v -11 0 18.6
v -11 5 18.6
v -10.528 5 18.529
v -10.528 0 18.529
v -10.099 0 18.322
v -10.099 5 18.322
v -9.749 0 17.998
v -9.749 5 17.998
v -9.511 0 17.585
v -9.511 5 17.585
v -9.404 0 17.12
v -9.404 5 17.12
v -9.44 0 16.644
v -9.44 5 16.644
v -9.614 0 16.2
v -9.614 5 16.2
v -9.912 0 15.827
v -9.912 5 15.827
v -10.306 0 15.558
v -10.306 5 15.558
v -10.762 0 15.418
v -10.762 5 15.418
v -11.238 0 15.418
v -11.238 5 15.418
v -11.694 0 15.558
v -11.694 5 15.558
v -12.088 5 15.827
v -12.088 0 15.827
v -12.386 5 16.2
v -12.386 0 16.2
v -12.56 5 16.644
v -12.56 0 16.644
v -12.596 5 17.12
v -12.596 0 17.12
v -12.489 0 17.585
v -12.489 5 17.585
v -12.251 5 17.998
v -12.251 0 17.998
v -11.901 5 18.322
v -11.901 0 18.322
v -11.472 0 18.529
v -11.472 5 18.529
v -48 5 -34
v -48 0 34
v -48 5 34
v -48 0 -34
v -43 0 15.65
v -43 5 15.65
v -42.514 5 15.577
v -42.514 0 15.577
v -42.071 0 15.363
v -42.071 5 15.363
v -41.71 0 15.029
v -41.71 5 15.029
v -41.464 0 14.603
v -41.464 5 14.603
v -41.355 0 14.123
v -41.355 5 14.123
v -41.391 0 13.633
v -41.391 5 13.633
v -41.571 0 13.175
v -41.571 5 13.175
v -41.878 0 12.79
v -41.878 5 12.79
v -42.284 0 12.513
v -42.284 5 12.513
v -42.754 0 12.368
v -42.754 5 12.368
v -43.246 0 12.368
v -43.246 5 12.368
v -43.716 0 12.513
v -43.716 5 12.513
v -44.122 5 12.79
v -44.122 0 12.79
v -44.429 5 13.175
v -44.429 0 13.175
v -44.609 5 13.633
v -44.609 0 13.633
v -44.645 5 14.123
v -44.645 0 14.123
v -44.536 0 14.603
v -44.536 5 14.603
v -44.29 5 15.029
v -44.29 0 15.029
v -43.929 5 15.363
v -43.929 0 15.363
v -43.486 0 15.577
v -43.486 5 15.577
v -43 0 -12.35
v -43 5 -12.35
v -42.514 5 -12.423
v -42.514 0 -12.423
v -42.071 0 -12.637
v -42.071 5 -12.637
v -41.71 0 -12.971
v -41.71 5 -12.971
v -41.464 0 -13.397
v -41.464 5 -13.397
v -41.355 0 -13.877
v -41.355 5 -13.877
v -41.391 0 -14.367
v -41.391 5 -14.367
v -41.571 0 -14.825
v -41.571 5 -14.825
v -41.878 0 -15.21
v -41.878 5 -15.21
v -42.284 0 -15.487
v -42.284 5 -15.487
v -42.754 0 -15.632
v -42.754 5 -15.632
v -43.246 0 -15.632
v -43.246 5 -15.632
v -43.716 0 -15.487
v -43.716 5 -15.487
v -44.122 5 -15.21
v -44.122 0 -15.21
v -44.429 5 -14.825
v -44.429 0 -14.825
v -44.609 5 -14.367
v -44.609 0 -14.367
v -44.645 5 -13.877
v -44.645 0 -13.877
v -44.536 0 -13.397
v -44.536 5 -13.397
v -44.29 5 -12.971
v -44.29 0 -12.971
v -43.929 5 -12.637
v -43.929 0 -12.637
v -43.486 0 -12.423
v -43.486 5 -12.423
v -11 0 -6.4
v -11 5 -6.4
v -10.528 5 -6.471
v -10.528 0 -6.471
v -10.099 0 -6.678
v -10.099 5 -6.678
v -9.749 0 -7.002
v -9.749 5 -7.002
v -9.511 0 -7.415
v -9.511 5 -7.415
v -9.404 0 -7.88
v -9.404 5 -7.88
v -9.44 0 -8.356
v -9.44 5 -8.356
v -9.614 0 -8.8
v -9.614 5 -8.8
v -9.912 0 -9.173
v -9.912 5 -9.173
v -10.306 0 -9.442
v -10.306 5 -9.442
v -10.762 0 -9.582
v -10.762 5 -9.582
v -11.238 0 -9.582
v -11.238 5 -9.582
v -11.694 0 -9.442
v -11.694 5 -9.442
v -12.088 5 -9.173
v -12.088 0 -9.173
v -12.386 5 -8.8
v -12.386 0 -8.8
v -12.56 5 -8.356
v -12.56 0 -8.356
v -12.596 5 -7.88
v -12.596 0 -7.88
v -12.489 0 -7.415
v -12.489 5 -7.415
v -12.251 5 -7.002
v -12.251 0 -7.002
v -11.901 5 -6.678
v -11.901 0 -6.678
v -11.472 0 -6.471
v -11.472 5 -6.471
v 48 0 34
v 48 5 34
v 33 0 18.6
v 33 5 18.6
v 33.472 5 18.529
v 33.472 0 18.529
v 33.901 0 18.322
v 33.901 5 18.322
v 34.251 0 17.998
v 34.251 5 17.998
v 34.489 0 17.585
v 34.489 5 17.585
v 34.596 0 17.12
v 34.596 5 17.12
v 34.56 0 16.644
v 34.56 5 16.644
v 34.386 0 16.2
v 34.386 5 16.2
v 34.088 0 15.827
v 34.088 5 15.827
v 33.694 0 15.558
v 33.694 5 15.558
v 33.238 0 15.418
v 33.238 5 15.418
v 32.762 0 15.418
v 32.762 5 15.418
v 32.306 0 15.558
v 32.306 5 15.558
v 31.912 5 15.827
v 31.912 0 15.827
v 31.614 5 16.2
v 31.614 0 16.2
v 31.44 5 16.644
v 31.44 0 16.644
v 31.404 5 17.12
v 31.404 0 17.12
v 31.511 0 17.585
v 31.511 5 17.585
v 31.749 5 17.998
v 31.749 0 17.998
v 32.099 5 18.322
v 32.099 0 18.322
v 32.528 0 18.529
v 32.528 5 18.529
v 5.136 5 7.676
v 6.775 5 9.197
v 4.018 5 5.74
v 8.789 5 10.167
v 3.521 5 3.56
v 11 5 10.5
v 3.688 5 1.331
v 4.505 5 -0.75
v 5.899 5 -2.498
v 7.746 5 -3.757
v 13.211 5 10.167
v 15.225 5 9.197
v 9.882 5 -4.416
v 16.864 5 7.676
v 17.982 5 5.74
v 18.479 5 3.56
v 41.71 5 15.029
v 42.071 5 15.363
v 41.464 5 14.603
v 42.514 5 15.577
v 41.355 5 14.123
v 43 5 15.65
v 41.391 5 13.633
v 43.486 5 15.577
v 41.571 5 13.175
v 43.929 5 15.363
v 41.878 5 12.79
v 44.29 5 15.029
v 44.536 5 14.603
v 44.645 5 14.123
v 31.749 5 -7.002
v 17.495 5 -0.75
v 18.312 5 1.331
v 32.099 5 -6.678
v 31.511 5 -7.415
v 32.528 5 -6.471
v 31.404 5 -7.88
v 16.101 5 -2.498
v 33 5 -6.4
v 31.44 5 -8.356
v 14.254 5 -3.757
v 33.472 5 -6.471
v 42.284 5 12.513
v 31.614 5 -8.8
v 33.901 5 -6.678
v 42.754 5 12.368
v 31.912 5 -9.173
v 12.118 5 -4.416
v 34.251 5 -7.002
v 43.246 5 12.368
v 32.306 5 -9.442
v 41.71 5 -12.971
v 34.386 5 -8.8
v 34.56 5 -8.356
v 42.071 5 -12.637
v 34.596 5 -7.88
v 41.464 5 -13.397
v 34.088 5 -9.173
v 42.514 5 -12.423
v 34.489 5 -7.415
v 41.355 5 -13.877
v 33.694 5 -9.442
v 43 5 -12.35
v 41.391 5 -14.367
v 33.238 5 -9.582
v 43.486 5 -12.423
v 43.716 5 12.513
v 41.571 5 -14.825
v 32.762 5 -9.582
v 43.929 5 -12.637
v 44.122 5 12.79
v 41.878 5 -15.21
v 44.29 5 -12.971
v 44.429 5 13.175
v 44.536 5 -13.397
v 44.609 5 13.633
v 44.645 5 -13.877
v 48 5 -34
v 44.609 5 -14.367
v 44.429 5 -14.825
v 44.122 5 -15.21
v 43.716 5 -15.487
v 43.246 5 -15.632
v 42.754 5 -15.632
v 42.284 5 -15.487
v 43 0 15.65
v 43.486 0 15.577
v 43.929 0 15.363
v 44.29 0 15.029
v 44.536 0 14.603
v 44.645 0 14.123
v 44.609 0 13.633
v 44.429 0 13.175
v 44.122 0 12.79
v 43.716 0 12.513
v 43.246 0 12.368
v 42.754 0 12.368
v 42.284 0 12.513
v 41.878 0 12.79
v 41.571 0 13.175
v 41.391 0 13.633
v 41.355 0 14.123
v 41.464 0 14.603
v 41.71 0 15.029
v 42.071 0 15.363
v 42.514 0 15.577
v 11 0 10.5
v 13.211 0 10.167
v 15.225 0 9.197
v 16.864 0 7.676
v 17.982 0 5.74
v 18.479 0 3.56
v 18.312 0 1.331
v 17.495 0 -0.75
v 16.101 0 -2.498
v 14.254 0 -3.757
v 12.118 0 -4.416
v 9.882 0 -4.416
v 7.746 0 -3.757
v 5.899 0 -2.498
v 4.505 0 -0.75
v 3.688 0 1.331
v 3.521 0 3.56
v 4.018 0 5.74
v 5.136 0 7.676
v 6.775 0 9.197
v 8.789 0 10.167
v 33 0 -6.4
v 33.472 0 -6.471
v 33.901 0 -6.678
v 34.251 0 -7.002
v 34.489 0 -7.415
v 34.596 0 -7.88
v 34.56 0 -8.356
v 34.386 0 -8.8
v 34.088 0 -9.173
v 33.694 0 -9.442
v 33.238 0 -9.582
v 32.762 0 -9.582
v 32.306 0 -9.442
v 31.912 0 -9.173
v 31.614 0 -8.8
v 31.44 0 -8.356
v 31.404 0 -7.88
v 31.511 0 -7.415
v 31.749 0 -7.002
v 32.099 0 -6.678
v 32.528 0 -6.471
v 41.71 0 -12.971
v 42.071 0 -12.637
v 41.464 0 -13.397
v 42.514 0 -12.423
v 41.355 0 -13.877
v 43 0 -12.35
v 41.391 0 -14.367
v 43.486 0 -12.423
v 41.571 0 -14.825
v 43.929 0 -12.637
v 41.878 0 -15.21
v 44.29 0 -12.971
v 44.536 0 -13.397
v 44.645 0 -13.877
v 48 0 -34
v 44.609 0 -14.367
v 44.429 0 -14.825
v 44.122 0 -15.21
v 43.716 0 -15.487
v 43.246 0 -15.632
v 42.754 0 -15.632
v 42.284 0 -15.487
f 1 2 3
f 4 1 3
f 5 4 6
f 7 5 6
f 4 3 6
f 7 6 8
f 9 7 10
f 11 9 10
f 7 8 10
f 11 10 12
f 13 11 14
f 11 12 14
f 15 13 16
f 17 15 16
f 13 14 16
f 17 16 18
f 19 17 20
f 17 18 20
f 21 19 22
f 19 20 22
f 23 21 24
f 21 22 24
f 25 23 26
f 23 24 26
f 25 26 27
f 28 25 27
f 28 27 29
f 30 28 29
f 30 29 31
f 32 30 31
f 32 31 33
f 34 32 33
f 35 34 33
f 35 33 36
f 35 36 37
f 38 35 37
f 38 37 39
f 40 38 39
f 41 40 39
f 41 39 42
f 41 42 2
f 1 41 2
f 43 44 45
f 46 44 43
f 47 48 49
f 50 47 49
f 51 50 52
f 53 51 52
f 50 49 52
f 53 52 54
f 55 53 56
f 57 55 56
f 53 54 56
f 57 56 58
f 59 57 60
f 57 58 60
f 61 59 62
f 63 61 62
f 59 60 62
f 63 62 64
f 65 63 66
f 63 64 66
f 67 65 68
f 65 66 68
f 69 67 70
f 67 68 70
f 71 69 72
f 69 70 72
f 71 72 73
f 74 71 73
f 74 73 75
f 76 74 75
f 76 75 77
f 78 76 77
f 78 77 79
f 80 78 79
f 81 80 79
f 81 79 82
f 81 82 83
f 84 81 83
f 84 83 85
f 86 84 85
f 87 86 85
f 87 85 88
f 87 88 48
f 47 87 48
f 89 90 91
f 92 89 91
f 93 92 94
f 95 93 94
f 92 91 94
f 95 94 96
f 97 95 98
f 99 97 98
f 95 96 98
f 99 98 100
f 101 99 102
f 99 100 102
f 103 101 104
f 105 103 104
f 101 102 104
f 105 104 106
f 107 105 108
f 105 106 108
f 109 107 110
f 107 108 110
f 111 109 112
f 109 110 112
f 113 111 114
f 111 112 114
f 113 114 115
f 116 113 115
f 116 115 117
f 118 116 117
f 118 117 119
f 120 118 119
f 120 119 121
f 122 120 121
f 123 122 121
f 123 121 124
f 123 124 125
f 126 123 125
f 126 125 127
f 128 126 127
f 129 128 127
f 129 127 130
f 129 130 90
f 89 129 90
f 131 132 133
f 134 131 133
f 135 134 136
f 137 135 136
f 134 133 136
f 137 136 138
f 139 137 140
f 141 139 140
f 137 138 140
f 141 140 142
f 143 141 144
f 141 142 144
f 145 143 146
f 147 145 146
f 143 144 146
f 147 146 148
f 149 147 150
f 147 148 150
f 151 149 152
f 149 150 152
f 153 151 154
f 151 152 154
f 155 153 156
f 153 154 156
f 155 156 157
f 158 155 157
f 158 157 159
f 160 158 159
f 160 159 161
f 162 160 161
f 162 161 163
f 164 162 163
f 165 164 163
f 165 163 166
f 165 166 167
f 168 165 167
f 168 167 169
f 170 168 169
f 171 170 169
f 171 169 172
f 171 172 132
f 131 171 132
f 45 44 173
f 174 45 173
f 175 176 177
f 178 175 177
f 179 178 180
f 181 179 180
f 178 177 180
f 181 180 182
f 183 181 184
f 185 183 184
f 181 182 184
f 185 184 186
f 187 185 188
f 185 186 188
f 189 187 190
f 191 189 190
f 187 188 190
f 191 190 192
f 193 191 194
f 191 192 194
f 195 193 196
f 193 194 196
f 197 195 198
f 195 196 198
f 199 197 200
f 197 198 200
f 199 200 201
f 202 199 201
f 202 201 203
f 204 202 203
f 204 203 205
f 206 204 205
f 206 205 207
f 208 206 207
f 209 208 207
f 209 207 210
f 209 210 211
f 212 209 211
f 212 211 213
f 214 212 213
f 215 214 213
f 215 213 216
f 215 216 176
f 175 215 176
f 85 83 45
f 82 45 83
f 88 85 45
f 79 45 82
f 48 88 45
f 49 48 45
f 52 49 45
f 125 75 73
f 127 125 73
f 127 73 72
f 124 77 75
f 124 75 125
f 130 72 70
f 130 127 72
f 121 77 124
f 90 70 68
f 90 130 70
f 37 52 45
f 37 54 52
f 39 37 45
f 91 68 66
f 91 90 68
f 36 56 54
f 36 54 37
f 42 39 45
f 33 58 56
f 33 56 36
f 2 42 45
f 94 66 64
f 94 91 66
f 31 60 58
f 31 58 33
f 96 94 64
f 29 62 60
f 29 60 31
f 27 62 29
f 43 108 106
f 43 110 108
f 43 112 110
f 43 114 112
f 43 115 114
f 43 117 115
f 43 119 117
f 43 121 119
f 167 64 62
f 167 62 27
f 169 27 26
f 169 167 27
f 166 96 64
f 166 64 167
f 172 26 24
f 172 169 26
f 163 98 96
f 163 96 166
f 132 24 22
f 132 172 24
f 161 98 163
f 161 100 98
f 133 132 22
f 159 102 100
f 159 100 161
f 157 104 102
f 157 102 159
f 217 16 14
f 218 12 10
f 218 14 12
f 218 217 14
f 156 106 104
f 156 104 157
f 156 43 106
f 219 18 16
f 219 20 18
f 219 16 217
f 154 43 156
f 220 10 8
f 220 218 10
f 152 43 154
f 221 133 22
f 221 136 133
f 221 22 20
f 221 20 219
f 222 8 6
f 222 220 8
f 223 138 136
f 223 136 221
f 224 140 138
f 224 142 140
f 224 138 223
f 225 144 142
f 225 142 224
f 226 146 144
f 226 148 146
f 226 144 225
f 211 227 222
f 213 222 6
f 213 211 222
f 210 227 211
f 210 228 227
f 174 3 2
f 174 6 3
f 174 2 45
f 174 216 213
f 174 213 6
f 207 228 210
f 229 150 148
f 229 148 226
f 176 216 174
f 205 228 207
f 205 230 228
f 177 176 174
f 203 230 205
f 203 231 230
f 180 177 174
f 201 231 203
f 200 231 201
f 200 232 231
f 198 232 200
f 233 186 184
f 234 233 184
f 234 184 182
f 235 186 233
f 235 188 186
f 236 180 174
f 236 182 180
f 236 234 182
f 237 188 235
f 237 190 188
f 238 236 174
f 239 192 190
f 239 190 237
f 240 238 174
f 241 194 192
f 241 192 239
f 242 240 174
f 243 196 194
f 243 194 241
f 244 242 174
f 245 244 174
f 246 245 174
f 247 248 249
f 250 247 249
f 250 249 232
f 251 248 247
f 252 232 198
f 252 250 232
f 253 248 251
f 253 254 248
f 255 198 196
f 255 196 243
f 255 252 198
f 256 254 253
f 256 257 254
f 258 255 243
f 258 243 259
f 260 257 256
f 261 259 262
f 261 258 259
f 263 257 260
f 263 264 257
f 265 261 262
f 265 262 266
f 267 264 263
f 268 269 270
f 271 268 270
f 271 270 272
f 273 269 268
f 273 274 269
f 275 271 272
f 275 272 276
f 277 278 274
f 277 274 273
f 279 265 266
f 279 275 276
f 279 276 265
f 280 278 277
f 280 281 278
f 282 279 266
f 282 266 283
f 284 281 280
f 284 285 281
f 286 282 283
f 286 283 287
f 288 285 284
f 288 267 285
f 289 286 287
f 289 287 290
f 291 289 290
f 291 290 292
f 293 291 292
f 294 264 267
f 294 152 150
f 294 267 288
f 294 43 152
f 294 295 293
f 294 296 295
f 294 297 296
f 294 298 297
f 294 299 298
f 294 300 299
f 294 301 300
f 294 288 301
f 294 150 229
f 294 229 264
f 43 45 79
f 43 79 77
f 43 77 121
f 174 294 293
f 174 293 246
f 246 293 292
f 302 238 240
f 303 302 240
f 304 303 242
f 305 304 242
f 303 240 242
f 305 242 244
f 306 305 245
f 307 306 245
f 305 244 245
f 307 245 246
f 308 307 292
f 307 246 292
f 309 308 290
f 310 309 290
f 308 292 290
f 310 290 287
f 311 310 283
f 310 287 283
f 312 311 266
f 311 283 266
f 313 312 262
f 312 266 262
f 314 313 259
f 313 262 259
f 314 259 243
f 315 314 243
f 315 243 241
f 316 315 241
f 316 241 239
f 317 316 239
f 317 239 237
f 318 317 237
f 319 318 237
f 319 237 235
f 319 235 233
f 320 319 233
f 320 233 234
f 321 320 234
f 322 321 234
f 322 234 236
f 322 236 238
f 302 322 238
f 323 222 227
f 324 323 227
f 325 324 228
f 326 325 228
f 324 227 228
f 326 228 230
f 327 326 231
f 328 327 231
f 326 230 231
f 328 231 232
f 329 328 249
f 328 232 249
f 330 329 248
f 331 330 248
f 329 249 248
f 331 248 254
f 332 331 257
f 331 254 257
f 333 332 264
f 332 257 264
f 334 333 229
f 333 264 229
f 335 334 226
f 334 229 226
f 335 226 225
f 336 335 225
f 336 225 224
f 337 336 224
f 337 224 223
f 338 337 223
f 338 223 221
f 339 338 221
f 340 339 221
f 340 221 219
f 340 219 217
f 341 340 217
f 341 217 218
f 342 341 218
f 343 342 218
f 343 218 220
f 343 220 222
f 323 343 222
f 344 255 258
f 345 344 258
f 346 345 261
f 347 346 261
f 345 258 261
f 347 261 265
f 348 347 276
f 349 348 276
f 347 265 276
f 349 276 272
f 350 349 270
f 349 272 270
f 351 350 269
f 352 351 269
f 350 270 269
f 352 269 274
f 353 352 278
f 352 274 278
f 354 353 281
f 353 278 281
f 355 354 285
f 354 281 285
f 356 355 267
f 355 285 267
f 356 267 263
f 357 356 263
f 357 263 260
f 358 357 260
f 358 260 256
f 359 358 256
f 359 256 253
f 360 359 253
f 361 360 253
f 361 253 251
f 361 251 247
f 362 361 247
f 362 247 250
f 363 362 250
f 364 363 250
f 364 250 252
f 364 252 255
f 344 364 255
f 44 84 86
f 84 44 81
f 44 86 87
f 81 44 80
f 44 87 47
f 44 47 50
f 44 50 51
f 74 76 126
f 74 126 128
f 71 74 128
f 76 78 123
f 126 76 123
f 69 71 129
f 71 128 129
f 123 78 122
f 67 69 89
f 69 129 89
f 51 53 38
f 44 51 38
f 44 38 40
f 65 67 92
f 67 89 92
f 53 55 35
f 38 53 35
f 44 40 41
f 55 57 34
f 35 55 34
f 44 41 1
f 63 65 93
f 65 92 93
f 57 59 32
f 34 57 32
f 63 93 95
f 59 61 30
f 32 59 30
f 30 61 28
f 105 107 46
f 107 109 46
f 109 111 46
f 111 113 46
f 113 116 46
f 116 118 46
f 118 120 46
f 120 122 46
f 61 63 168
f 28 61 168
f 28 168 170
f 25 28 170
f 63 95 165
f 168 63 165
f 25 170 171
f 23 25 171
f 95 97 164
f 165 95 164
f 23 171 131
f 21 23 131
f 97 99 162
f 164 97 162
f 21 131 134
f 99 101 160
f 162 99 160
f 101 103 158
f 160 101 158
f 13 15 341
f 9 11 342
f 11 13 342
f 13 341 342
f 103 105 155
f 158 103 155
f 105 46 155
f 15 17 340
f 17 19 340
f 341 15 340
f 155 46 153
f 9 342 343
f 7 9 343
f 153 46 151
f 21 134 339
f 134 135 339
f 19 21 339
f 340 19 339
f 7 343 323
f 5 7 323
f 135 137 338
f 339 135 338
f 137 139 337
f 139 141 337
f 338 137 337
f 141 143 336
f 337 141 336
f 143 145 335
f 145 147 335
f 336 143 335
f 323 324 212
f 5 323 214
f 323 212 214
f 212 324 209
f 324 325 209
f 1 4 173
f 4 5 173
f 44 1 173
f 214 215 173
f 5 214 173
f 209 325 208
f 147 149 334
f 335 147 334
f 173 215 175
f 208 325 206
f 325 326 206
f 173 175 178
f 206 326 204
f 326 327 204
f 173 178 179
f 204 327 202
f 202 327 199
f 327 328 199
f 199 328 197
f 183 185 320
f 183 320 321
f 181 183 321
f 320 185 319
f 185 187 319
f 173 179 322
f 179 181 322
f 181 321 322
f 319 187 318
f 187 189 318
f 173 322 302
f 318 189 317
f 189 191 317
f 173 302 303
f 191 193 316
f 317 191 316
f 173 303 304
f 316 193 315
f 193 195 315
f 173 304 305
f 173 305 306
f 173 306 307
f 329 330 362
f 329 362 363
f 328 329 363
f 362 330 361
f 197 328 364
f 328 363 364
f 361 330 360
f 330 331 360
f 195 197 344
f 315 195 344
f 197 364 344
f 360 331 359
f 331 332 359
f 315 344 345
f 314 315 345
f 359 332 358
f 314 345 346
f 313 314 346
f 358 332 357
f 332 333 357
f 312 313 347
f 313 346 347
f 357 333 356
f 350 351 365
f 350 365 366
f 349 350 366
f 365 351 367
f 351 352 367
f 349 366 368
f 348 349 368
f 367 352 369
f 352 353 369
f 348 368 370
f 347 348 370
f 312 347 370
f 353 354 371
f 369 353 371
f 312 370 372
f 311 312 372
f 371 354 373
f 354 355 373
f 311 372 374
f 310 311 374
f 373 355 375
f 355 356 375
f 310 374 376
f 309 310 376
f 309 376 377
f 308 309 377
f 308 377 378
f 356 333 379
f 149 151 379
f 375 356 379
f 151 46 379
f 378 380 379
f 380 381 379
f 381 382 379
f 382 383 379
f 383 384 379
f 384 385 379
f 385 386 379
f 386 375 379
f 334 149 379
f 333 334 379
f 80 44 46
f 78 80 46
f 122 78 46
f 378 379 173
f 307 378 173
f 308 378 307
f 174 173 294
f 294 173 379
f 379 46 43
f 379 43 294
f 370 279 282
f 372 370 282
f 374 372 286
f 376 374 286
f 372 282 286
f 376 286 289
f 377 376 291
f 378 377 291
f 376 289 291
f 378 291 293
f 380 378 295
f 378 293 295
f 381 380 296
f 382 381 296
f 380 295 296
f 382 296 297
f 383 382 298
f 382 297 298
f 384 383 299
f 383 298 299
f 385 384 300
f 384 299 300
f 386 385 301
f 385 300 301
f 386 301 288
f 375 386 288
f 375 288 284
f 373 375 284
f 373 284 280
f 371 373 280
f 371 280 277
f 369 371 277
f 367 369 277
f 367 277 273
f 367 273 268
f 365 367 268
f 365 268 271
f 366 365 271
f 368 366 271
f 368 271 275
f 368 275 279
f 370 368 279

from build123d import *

# Parameters (mm, degrees)
SKETCH1_W           = 96
SKETCH1_H           = 68
BOSS_EXTRUDE1_DEPTH = 5
SKETCH2_R           = 1.65
SKETCH2_R_2         = 1.6
SKETCH2_R_3         = 7.5
CUT_EXTRUDE1_DEPTH  = 60.033888573


with BuildPart() as part:
    # Sketch1 → Boss-Extrude1 (new body)
    with BuildSketch(Plane(origin=(0, 0, 0), x_dir=(1, 0, 0), z_dir=(0, 1, 0))):
        Rectangle(SKETCH1_W, SKETCH1_H)
    extrude(amount=BOSS_EXTRUDE1_DEPTH)

    # Sketch2 → Cut-Extrude1 (cut, through all)
    with BuildSketch(Plane(origin=(0, 5, 0), x_dir=(1, 0, 0), z_dir=(0, 1, 0))):
        with Locations(Location((-43, 14, 0), (0, 0, 270))):
            Circle(SKETCH2_R)
        with Locations(Location((43, 14, 0), (0, 0, 270))):
            Circle(SKETCH2_R)
        with Locations(Location((43, -14, 0), (0, 0, 270))):
            Circle(SKETCH2_R)
        with Locations(Location((-43, -14, 0), (0, 0, 270))):
            Circle(SKETCH2_R)
        with Locations(Location((-11, 8, 0), (0, 0, 270))):
            Circle(SKETCH2_R_2)
        with Locations(Location((33, 8, 0), (0, 0, 270))):
            Circle(SKETCH2_R_2)
        with Locations(Location((33, -17, 0), (0, 0, 270))):
            Circle(SKETCH2_R_2)
        with Locations(Location((-11, -17, 0), (0, 0, 270))):
            Circle(SKETCH2_R_2)
        with Locations(Location((11, -3, 0), (0, 0, 270))):
            Circle(SKETCH2_R_3)
    extrude(amount=-CUT_EXTRUDE1_DEPTH, mode=Mode.SUBTRACT)


solid = part.part
